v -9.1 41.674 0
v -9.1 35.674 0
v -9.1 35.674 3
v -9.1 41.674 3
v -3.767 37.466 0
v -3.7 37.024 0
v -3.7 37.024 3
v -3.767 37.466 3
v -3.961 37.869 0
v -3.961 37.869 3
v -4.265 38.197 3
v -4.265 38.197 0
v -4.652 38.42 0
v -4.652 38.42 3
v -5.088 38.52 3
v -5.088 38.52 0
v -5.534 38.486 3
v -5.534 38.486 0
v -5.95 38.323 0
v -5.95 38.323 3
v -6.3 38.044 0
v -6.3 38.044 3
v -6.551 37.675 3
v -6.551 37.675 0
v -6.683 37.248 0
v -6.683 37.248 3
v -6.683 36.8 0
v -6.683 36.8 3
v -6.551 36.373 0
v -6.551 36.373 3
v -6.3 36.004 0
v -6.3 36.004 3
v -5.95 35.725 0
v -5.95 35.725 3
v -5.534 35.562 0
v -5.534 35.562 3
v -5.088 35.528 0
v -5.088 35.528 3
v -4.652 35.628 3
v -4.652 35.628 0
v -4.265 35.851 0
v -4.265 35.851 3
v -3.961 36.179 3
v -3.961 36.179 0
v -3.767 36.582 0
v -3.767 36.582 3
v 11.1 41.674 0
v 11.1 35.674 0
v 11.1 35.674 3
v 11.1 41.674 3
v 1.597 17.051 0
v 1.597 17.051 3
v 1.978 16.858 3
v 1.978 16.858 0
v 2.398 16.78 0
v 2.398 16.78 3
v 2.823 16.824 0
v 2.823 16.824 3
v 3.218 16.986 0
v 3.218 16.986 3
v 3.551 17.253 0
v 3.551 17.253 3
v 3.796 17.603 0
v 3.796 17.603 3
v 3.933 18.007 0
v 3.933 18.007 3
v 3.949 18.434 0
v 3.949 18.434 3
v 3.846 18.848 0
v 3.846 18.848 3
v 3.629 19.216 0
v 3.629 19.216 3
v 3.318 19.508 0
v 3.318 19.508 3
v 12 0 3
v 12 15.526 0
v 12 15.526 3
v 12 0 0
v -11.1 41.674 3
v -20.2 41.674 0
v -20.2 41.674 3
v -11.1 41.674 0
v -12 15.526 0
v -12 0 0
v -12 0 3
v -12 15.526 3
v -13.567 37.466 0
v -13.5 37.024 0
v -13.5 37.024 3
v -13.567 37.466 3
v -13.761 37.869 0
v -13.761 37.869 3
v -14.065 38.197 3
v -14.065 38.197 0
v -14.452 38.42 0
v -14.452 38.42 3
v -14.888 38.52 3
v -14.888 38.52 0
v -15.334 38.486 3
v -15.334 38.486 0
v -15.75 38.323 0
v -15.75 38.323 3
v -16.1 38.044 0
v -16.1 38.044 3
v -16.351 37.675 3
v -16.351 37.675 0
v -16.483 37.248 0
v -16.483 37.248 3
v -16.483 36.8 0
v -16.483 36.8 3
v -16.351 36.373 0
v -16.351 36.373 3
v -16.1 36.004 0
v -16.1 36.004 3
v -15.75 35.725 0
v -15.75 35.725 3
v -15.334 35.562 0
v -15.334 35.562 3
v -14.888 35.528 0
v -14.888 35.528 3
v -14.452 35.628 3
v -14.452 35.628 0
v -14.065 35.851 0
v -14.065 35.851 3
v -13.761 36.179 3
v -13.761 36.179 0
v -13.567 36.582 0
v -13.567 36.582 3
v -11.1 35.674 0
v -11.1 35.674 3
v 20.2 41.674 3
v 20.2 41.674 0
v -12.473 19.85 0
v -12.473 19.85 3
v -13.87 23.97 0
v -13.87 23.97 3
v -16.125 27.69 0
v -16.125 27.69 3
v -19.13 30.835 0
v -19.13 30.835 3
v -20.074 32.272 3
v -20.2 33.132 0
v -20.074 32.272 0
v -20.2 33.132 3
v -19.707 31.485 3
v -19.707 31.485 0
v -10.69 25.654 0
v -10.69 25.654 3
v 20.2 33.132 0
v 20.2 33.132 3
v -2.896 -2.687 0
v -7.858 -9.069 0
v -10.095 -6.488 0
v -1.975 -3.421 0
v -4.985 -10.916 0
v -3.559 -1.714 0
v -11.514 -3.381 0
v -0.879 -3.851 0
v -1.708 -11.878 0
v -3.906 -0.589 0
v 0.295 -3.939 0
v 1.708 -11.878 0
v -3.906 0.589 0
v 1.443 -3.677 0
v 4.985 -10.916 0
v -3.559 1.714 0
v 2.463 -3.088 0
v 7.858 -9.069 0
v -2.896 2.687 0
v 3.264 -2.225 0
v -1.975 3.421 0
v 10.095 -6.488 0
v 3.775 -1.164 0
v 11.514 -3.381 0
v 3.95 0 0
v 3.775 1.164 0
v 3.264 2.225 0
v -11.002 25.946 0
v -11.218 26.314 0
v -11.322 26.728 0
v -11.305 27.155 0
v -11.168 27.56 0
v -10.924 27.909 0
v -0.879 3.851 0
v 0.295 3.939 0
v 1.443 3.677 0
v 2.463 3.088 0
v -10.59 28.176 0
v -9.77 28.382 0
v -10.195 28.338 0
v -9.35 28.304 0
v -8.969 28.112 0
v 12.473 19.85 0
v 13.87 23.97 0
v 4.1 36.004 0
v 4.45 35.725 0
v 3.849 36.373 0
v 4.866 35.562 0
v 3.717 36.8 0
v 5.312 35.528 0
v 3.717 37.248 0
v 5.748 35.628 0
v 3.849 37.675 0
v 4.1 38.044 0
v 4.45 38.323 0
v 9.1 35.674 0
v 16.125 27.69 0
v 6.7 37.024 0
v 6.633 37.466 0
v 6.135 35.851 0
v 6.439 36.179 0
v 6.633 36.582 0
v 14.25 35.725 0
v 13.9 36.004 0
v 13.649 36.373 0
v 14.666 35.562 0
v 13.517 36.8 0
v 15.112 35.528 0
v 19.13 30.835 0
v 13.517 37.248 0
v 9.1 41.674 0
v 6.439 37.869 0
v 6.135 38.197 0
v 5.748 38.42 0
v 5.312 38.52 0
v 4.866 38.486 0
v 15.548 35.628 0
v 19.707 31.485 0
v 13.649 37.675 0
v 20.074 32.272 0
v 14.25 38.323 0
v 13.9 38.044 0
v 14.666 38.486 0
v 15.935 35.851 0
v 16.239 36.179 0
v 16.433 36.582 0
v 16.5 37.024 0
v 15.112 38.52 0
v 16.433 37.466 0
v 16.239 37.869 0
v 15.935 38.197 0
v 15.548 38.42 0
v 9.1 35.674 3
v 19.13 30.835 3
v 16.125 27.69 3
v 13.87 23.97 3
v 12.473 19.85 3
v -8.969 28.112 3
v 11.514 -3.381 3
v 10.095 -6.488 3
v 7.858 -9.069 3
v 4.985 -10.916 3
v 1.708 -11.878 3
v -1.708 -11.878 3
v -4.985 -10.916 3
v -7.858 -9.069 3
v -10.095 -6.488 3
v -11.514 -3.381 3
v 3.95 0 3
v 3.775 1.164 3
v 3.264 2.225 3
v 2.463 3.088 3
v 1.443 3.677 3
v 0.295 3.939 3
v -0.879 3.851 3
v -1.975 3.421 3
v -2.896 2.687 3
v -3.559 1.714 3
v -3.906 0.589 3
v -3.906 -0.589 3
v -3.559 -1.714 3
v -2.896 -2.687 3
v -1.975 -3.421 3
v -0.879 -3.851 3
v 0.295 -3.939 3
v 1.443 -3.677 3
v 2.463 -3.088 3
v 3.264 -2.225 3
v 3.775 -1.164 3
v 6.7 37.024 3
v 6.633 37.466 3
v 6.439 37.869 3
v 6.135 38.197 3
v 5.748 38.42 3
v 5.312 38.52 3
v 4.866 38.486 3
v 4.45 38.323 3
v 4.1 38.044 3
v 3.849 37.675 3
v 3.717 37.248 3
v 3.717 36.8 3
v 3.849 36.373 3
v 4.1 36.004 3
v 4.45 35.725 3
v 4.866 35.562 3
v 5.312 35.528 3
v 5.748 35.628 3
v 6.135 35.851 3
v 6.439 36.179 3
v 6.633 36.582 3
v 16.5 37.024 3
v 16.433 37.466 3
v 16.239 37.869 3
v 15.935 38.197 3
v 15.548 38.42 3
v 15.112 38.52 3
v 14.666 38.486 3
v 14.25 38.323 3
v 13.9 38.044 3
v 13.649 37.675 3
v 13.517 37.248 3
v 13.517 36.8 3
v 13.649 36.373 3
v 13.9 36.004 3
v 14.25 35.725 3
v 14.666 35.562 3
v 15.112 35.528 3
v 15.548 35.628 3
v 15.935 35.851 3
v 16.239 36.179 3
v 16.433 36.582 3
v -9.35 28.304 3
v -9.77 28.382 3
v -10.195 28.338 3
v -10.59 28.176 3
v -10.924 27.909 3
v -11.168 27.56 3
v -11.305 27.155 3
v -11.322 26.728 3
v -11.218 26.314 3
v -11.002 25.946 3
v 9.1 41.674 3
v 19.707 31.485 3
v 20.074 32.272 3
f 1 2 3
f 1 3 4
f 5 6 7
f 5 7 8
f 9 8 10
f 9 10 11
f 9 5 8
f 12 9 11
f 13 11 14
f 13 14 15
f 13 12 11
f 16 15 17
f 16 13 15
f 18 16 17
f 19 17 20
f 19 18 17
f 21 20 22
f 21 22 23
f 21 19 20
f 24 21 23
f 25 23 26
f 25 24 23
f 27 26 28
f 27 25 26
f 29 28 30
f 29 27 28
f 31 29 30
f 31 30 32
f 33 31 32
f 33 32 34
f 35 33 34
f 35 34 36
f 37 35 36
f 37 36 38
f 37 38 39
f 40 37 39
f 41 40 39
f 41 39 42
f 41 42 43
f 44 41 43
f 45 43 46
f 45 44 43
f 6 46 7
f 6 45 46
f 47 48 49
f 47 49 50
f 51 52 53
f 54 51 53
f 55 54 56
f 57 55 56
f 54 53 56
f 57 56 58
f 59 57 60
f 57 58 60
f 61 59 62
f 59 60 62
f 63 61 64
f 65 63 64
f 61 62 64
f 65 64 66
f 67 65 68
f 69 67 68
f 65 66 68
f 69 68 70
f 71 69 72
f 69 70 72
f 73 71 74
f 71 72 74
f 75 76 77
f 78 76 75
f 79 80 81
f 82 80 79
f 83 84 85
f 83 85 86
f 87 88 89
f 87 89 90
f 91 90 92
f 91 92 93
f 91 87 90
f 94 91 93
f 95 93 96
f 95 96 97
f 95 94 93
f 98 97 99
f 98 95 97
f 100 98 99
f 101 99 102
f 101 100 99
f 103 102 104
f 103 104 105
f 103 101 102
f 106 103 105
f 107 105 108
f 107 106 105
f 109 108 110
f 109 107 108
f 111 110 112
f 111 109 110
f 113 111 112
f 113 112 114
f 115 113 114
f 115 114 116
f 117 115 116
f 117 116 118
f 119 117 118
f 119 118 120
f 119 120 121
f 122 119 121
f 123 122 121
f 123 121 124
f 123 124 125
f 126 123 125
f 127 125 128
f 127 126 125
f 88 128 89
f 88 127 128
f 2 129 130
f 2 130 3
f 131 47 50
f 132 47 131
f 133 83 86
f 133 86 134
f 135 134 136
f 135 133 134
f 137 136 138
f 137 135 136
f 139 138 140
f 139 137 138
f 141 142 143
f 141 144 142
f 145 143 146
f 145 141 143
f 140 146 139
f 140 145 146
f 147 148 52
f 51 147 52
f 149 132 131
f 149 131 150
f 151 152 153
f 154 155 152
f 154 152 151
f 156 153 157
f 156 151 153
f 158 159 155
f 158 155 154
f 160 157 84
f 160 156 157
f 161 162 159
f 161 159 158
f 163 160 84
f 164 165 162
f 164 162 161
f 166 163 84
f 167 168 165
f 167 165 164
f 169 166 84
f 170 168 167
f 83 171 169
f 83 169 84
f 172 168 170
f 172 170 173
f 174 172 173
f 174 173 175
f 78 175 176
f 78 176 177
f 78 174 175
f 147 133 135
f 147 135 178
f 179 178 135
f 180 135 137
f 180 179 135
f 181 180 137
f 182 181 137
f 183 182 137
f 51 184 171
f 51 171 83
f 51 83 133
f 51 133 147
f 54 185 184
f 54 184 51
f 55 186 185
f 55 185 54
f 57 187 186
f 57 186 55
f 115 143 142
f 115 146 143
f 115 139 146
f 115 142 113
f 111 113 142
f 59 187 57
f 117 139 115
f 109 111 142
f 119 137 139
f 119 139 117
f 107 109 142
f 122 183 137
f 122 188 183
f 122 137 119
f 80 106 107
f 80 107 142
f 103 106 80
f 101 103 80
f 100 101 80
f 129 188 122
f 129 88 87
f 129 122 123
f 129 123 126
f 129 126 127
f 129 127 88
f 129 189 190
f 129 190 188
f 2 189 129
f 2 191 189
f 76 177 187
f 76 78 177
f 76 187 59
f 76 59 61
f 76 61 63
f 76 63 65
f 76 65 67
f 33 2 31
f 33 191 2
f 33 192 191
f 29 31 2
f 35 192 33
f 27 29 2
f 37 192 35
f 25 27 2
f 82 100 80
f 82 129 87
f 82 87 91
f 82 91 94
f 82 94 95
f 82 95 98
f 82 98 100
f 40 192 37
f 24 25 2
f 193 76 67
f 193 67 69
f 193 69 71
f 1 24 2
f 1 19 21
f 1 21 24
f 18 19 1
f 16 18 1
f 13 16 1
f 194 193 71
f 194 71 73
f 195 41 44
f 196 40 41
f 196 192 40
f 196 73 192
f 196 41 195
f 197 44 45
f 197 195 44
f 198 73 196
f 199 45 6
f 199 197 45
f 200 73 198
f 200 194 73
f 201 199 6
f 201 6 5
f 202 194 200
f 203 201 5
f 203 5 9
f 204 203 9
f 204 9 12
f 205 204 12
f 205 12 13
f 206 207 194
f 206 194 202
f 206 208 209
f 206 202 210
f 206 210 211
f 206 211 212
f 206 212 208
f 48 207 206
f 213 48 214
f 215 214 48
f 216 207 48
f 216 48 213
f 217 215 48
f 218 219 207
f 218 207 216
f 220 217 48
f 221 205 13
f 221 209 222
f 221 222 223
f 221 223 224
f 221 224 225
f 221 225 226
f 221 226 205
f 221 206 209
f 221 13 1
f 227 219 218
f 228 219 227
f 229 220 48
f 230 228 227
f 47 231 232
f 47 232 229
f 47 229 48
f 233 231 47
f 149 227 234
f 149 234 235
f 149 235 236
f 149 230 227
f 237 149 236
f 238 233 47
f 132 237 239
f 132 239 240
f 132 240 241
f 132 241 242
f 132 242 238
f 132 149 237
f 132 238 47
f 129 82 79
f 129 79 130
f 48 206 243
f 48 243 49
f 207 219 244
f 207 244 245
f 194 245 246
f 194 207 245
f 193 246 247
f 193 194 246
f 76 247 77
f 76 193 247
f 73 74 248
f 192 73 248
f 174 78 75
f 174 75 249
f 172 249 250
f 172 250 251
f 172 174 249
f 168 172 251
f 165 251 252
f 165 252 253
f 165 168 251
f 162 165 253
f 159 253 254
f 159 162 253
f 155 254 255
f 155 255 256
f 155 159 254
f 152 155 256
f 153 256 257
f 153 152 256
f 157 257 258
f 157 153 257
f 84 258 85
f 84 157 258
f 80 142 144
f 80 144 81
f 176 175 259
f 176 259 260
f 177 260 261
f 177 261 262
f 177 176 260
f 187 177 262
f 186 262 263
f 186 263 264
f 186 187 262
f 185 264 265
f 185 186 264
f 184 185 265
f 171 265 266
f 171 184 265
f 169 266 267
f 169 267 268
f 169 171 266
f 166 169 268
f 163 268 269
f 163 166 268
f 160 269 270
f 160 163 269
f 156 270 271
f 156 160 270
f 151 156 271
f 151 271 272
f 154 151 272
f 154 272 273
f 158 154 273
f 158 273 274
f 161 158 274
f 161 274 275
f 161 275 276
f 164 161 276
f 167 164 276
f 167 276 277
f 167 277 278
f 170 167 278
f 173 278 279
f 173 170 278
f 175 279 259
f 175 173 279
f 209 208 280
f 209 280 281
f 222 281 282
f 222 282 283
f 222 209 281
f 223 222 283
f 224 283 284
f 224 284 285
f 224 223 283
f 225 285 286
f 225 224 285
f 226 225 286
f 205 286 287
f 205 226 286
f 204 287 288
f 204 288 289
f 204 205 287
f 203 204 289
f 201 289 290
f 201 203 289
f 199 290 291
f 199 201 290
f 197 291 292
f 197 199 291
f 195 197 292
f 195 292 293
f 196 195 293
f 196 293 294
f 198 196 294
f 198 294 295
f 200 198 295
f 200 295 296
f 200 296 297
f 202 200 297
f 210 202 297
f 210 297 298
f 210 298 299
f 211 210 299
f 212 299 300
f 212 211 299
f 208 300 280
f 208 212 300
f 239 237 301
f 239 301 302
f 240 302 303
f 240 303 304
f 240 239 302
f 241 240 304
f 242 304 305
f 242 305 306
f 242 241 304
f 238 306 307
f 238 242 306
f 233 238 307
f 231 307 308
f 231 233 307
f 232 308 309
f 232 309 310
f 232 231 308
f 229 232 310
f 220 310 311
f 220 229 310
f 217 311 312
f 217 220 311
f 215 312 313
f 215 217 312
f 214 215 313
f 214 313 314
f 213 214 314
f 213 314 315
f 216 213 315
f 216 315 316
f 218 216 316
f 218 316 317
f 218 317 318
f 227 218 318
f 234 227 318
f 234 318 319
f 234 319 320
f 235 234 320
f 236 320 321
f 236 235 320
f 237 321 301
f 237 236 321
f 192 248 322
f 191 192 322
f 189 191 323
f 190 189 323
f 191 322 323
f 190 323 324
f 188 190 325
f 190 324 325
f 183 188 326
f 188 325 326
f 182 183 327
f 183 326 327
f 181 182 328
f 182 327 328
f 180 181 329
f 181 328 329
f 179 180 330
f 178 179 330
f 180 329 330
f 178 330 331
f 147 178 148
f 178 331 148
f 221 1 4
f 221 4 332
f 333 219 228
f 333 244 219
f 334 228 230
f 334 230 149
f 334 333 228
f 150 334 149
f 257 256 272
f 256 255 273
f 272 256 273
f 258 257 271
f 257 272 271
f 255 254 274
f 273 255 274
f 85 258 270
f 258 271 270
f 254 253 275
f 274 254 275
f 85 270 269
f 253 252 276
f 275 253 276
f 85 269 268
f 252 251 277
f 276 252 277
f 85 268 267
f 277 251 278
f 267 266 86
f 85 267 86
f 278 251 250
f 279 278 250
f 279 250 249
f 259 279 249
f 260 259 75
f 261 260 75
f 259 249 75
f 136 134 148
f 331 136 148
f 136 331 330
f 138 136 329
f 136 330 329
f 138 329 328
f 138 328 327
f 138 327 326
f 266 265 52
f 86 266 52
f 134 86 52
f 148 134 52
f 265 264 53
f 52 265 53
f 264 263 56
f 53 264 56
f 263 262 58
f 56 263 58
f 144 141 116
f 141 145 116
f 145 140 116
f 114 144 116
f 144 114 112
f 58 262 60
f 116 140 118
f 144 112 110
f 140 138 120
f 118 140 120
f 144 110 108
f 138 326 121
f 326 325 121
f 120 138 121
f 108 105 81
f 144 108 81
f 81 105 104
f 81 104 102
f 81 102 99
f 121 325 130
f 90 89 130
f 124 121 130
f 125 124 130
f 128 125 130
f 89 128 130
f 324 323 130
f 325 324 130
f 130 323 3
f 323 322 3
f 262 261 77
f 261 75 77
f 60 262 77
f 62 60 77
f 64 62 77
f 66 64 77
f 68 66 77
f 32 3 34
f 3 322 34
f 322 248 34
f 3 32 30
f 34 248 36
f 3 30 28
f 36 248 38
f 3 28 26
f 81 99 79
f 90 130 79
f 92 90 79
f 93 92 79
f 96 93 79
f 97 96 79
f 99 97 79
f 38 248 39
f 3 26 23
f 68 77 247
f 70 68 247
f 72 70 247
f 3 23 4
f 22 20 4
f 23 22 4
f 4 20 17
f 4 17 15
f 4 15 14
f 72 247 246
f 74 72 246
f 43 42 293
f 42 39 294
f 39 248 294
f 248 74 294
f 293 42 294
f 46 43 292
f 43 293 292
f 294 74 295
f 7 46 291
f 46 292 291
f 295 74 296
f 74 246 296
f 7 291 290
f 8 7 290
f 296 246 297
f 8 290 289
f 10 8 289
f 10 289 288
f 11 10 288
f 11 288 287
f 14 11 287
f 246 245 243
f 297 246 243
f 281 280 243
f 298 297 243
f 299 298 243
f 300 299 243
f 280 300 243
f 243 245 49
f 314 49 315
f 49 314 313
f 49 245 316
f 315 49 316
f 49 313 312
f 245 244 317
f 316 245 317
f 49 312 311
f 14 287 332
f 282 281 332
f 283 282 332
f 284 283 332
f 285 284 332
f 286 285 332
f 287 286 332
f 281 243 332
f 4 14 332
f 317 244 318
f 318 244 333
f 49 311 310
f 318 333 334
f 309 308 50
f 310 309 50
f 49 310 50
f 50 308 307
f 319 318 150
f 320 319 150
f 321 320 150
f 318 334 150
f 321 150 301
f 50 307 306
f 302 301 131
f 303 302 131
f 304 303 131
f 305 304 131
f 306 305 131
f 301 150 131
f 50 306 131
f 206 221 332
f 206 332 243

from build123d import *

# Parameters (mm, degrees)
SKETCH1_R           = 3.95
SKETCH1_R_2         = 1.5
BOSS_EXTRUDE1_DEPTH = 3
FILLET1_R           = 20
FILLET2_R           = 3
CUT_EXTRUDE1_DEPTH  = 3


with BuildPart() as part:
    # Sketch1 → Boss-Extrude1 (new body)
    with BuildSketch(Plane.XY):
        with BuildLine():
            Line((0, 41.674052381), (9.1, 41.674052381))
            Line((9.1, 41.674052381), (9.1, 35.674052381))
            Line((9.1, 35.674052381), (11.1, 35.674052381))
            Line((11.1, 35.674052381), (11.1, 41.674052381))
            Line((11.1, 41.674052381), (20.2, 41.674052381))
            Line((20.2, 41.674052381), (20.2, 31.674052381))
            Line((20.2, 31.674052381), (12, 31.674052381))
            Line((12, 31.674052381), (12, 0))
            ThreePointArc((12, 0), (0, -12), (-12, 0))
            Line((-12, 0), (-12, 31.674052381))
            Line((-12, 31.674052381), (-20.2, 31.674052381))
            Line((-20.2, 31.674052381), (-20.2, 41.674052381))
            Line((-20.2, 41.674052381), (-11.1, 41.674052381))
            Line((-11.1, 41.674052381), (-11.1, 35.674052381))
            Line((-11.1, 35.674052381), (-9.1, 35.674052381))
            Line((-9.1, 35.674052381), (-9.1, 41.674052381))
            Line((-9.1, 41.674052381), (0, 41.674052381))
        make_face()
        Circle(SKETCH1_R, mode=Mode.SUBTRACT)
        with Locations((-15, 37.024052381)):
            Circle(SKETCH1_R_2, mode=Mode.SUBTRACT)
        with Locations((-5.2, 37.024052381)):
            Circle(SKETCH1_R_2, mode=Mode.SUBTRACT)
        with Locations((5.2, 37.024052381)):
            Circle(SKETCH1_R_2, mode=Mode.SUBTRACT)
        with Locations((15, 37.024052381)):
            Circle(SKETCH1_R_2, mode=Mode.SUBTRACT)
    extrude(amount=BOSS_EXTRUDE1_DEPTH)

    # Fillet1
    # the kernel refuses this fillet: 20 mm, written as the material it adds along each edge
    with BuildSketch(Plane(origin=(-12, 31.674052381, 0), x_dir=(0, -1, 0), z_dir=(0, 0, 1))) as fillet1_piece_1:
        with BuildLine():
            CenterArc((16.1480649, -20), FILLET1_R, 90, 53.842991799)
            Line((0, -8.2), (-0.322961298, -7.964))
            ThreePointArc((-0.322961298, -7.964), (-0.4, -4.1), (-0.4, 0))
            Line((-0.4, 0), (0, 0.4))
            Line((0, 0.4), (16.1480649, 0.4))
            Line((16.1480649, 0.4), (16.1480649, 0))
        make_face()
    extrude(amount=3)
    with BuildSketch(Plane(origin=(12, 31.674052381, 0), x_dir=(0, -1, 0), z_dir=(0, 0, 1))) as fillet1_piece_2:
        with BuildLine():
            CenterArc((16.1480649, 20), FILLET1_R, 216.157008201, 53.842991799)
            Line((0, 8.2), (-0.322961298, 7.964))
            ThreePointArc((-0.322961298, 7.964), (-0.4, 4.1), (-0.4, 0))
            Line((-0.4, 0), (0, -0.4))
            Line((0, -0.4), (16.1480649, -0.4))
            Line((16.1480649, -0.4), (16.1480649, 0))
        make_face()
    extrude(amount=3)

    # Fillet2
    fillet2_edges = [part.edges().sort_by_distance(p)[0] for p in [
        (20.2, 31.674052381, 1.5),
        (-20.2, 31.674052381, 1.5),
    ]]
    fillet(fillet2_edges, radius=FILLET2_R)

    # Sketch2 → Cut-Extrude1 (cut)
    with BuildSketch(Plane.XY.offset(3)):
        with BuildLine():
            Line((-10.690189186, 25.65418917), (1.597091478, 17.050542625))
            ThreePointArc((1.597091478, 17.050542625), (3.686184199, 17.418906036), (3.317820787, 19.507998757))
            Line((3.317820787, 19.507998757), (-8.969459877, 28.111645303))
            ThreePointArc((-8.969459877, 28.111645303), (-11.058552598, 27.743281891), (-10.690189186, 25.65418917))
        make_face()
    extrude(amount=-CUT_EXTRUDE1_DEPTH, mode=Mode.SUBTRACT)


solid = part.part
